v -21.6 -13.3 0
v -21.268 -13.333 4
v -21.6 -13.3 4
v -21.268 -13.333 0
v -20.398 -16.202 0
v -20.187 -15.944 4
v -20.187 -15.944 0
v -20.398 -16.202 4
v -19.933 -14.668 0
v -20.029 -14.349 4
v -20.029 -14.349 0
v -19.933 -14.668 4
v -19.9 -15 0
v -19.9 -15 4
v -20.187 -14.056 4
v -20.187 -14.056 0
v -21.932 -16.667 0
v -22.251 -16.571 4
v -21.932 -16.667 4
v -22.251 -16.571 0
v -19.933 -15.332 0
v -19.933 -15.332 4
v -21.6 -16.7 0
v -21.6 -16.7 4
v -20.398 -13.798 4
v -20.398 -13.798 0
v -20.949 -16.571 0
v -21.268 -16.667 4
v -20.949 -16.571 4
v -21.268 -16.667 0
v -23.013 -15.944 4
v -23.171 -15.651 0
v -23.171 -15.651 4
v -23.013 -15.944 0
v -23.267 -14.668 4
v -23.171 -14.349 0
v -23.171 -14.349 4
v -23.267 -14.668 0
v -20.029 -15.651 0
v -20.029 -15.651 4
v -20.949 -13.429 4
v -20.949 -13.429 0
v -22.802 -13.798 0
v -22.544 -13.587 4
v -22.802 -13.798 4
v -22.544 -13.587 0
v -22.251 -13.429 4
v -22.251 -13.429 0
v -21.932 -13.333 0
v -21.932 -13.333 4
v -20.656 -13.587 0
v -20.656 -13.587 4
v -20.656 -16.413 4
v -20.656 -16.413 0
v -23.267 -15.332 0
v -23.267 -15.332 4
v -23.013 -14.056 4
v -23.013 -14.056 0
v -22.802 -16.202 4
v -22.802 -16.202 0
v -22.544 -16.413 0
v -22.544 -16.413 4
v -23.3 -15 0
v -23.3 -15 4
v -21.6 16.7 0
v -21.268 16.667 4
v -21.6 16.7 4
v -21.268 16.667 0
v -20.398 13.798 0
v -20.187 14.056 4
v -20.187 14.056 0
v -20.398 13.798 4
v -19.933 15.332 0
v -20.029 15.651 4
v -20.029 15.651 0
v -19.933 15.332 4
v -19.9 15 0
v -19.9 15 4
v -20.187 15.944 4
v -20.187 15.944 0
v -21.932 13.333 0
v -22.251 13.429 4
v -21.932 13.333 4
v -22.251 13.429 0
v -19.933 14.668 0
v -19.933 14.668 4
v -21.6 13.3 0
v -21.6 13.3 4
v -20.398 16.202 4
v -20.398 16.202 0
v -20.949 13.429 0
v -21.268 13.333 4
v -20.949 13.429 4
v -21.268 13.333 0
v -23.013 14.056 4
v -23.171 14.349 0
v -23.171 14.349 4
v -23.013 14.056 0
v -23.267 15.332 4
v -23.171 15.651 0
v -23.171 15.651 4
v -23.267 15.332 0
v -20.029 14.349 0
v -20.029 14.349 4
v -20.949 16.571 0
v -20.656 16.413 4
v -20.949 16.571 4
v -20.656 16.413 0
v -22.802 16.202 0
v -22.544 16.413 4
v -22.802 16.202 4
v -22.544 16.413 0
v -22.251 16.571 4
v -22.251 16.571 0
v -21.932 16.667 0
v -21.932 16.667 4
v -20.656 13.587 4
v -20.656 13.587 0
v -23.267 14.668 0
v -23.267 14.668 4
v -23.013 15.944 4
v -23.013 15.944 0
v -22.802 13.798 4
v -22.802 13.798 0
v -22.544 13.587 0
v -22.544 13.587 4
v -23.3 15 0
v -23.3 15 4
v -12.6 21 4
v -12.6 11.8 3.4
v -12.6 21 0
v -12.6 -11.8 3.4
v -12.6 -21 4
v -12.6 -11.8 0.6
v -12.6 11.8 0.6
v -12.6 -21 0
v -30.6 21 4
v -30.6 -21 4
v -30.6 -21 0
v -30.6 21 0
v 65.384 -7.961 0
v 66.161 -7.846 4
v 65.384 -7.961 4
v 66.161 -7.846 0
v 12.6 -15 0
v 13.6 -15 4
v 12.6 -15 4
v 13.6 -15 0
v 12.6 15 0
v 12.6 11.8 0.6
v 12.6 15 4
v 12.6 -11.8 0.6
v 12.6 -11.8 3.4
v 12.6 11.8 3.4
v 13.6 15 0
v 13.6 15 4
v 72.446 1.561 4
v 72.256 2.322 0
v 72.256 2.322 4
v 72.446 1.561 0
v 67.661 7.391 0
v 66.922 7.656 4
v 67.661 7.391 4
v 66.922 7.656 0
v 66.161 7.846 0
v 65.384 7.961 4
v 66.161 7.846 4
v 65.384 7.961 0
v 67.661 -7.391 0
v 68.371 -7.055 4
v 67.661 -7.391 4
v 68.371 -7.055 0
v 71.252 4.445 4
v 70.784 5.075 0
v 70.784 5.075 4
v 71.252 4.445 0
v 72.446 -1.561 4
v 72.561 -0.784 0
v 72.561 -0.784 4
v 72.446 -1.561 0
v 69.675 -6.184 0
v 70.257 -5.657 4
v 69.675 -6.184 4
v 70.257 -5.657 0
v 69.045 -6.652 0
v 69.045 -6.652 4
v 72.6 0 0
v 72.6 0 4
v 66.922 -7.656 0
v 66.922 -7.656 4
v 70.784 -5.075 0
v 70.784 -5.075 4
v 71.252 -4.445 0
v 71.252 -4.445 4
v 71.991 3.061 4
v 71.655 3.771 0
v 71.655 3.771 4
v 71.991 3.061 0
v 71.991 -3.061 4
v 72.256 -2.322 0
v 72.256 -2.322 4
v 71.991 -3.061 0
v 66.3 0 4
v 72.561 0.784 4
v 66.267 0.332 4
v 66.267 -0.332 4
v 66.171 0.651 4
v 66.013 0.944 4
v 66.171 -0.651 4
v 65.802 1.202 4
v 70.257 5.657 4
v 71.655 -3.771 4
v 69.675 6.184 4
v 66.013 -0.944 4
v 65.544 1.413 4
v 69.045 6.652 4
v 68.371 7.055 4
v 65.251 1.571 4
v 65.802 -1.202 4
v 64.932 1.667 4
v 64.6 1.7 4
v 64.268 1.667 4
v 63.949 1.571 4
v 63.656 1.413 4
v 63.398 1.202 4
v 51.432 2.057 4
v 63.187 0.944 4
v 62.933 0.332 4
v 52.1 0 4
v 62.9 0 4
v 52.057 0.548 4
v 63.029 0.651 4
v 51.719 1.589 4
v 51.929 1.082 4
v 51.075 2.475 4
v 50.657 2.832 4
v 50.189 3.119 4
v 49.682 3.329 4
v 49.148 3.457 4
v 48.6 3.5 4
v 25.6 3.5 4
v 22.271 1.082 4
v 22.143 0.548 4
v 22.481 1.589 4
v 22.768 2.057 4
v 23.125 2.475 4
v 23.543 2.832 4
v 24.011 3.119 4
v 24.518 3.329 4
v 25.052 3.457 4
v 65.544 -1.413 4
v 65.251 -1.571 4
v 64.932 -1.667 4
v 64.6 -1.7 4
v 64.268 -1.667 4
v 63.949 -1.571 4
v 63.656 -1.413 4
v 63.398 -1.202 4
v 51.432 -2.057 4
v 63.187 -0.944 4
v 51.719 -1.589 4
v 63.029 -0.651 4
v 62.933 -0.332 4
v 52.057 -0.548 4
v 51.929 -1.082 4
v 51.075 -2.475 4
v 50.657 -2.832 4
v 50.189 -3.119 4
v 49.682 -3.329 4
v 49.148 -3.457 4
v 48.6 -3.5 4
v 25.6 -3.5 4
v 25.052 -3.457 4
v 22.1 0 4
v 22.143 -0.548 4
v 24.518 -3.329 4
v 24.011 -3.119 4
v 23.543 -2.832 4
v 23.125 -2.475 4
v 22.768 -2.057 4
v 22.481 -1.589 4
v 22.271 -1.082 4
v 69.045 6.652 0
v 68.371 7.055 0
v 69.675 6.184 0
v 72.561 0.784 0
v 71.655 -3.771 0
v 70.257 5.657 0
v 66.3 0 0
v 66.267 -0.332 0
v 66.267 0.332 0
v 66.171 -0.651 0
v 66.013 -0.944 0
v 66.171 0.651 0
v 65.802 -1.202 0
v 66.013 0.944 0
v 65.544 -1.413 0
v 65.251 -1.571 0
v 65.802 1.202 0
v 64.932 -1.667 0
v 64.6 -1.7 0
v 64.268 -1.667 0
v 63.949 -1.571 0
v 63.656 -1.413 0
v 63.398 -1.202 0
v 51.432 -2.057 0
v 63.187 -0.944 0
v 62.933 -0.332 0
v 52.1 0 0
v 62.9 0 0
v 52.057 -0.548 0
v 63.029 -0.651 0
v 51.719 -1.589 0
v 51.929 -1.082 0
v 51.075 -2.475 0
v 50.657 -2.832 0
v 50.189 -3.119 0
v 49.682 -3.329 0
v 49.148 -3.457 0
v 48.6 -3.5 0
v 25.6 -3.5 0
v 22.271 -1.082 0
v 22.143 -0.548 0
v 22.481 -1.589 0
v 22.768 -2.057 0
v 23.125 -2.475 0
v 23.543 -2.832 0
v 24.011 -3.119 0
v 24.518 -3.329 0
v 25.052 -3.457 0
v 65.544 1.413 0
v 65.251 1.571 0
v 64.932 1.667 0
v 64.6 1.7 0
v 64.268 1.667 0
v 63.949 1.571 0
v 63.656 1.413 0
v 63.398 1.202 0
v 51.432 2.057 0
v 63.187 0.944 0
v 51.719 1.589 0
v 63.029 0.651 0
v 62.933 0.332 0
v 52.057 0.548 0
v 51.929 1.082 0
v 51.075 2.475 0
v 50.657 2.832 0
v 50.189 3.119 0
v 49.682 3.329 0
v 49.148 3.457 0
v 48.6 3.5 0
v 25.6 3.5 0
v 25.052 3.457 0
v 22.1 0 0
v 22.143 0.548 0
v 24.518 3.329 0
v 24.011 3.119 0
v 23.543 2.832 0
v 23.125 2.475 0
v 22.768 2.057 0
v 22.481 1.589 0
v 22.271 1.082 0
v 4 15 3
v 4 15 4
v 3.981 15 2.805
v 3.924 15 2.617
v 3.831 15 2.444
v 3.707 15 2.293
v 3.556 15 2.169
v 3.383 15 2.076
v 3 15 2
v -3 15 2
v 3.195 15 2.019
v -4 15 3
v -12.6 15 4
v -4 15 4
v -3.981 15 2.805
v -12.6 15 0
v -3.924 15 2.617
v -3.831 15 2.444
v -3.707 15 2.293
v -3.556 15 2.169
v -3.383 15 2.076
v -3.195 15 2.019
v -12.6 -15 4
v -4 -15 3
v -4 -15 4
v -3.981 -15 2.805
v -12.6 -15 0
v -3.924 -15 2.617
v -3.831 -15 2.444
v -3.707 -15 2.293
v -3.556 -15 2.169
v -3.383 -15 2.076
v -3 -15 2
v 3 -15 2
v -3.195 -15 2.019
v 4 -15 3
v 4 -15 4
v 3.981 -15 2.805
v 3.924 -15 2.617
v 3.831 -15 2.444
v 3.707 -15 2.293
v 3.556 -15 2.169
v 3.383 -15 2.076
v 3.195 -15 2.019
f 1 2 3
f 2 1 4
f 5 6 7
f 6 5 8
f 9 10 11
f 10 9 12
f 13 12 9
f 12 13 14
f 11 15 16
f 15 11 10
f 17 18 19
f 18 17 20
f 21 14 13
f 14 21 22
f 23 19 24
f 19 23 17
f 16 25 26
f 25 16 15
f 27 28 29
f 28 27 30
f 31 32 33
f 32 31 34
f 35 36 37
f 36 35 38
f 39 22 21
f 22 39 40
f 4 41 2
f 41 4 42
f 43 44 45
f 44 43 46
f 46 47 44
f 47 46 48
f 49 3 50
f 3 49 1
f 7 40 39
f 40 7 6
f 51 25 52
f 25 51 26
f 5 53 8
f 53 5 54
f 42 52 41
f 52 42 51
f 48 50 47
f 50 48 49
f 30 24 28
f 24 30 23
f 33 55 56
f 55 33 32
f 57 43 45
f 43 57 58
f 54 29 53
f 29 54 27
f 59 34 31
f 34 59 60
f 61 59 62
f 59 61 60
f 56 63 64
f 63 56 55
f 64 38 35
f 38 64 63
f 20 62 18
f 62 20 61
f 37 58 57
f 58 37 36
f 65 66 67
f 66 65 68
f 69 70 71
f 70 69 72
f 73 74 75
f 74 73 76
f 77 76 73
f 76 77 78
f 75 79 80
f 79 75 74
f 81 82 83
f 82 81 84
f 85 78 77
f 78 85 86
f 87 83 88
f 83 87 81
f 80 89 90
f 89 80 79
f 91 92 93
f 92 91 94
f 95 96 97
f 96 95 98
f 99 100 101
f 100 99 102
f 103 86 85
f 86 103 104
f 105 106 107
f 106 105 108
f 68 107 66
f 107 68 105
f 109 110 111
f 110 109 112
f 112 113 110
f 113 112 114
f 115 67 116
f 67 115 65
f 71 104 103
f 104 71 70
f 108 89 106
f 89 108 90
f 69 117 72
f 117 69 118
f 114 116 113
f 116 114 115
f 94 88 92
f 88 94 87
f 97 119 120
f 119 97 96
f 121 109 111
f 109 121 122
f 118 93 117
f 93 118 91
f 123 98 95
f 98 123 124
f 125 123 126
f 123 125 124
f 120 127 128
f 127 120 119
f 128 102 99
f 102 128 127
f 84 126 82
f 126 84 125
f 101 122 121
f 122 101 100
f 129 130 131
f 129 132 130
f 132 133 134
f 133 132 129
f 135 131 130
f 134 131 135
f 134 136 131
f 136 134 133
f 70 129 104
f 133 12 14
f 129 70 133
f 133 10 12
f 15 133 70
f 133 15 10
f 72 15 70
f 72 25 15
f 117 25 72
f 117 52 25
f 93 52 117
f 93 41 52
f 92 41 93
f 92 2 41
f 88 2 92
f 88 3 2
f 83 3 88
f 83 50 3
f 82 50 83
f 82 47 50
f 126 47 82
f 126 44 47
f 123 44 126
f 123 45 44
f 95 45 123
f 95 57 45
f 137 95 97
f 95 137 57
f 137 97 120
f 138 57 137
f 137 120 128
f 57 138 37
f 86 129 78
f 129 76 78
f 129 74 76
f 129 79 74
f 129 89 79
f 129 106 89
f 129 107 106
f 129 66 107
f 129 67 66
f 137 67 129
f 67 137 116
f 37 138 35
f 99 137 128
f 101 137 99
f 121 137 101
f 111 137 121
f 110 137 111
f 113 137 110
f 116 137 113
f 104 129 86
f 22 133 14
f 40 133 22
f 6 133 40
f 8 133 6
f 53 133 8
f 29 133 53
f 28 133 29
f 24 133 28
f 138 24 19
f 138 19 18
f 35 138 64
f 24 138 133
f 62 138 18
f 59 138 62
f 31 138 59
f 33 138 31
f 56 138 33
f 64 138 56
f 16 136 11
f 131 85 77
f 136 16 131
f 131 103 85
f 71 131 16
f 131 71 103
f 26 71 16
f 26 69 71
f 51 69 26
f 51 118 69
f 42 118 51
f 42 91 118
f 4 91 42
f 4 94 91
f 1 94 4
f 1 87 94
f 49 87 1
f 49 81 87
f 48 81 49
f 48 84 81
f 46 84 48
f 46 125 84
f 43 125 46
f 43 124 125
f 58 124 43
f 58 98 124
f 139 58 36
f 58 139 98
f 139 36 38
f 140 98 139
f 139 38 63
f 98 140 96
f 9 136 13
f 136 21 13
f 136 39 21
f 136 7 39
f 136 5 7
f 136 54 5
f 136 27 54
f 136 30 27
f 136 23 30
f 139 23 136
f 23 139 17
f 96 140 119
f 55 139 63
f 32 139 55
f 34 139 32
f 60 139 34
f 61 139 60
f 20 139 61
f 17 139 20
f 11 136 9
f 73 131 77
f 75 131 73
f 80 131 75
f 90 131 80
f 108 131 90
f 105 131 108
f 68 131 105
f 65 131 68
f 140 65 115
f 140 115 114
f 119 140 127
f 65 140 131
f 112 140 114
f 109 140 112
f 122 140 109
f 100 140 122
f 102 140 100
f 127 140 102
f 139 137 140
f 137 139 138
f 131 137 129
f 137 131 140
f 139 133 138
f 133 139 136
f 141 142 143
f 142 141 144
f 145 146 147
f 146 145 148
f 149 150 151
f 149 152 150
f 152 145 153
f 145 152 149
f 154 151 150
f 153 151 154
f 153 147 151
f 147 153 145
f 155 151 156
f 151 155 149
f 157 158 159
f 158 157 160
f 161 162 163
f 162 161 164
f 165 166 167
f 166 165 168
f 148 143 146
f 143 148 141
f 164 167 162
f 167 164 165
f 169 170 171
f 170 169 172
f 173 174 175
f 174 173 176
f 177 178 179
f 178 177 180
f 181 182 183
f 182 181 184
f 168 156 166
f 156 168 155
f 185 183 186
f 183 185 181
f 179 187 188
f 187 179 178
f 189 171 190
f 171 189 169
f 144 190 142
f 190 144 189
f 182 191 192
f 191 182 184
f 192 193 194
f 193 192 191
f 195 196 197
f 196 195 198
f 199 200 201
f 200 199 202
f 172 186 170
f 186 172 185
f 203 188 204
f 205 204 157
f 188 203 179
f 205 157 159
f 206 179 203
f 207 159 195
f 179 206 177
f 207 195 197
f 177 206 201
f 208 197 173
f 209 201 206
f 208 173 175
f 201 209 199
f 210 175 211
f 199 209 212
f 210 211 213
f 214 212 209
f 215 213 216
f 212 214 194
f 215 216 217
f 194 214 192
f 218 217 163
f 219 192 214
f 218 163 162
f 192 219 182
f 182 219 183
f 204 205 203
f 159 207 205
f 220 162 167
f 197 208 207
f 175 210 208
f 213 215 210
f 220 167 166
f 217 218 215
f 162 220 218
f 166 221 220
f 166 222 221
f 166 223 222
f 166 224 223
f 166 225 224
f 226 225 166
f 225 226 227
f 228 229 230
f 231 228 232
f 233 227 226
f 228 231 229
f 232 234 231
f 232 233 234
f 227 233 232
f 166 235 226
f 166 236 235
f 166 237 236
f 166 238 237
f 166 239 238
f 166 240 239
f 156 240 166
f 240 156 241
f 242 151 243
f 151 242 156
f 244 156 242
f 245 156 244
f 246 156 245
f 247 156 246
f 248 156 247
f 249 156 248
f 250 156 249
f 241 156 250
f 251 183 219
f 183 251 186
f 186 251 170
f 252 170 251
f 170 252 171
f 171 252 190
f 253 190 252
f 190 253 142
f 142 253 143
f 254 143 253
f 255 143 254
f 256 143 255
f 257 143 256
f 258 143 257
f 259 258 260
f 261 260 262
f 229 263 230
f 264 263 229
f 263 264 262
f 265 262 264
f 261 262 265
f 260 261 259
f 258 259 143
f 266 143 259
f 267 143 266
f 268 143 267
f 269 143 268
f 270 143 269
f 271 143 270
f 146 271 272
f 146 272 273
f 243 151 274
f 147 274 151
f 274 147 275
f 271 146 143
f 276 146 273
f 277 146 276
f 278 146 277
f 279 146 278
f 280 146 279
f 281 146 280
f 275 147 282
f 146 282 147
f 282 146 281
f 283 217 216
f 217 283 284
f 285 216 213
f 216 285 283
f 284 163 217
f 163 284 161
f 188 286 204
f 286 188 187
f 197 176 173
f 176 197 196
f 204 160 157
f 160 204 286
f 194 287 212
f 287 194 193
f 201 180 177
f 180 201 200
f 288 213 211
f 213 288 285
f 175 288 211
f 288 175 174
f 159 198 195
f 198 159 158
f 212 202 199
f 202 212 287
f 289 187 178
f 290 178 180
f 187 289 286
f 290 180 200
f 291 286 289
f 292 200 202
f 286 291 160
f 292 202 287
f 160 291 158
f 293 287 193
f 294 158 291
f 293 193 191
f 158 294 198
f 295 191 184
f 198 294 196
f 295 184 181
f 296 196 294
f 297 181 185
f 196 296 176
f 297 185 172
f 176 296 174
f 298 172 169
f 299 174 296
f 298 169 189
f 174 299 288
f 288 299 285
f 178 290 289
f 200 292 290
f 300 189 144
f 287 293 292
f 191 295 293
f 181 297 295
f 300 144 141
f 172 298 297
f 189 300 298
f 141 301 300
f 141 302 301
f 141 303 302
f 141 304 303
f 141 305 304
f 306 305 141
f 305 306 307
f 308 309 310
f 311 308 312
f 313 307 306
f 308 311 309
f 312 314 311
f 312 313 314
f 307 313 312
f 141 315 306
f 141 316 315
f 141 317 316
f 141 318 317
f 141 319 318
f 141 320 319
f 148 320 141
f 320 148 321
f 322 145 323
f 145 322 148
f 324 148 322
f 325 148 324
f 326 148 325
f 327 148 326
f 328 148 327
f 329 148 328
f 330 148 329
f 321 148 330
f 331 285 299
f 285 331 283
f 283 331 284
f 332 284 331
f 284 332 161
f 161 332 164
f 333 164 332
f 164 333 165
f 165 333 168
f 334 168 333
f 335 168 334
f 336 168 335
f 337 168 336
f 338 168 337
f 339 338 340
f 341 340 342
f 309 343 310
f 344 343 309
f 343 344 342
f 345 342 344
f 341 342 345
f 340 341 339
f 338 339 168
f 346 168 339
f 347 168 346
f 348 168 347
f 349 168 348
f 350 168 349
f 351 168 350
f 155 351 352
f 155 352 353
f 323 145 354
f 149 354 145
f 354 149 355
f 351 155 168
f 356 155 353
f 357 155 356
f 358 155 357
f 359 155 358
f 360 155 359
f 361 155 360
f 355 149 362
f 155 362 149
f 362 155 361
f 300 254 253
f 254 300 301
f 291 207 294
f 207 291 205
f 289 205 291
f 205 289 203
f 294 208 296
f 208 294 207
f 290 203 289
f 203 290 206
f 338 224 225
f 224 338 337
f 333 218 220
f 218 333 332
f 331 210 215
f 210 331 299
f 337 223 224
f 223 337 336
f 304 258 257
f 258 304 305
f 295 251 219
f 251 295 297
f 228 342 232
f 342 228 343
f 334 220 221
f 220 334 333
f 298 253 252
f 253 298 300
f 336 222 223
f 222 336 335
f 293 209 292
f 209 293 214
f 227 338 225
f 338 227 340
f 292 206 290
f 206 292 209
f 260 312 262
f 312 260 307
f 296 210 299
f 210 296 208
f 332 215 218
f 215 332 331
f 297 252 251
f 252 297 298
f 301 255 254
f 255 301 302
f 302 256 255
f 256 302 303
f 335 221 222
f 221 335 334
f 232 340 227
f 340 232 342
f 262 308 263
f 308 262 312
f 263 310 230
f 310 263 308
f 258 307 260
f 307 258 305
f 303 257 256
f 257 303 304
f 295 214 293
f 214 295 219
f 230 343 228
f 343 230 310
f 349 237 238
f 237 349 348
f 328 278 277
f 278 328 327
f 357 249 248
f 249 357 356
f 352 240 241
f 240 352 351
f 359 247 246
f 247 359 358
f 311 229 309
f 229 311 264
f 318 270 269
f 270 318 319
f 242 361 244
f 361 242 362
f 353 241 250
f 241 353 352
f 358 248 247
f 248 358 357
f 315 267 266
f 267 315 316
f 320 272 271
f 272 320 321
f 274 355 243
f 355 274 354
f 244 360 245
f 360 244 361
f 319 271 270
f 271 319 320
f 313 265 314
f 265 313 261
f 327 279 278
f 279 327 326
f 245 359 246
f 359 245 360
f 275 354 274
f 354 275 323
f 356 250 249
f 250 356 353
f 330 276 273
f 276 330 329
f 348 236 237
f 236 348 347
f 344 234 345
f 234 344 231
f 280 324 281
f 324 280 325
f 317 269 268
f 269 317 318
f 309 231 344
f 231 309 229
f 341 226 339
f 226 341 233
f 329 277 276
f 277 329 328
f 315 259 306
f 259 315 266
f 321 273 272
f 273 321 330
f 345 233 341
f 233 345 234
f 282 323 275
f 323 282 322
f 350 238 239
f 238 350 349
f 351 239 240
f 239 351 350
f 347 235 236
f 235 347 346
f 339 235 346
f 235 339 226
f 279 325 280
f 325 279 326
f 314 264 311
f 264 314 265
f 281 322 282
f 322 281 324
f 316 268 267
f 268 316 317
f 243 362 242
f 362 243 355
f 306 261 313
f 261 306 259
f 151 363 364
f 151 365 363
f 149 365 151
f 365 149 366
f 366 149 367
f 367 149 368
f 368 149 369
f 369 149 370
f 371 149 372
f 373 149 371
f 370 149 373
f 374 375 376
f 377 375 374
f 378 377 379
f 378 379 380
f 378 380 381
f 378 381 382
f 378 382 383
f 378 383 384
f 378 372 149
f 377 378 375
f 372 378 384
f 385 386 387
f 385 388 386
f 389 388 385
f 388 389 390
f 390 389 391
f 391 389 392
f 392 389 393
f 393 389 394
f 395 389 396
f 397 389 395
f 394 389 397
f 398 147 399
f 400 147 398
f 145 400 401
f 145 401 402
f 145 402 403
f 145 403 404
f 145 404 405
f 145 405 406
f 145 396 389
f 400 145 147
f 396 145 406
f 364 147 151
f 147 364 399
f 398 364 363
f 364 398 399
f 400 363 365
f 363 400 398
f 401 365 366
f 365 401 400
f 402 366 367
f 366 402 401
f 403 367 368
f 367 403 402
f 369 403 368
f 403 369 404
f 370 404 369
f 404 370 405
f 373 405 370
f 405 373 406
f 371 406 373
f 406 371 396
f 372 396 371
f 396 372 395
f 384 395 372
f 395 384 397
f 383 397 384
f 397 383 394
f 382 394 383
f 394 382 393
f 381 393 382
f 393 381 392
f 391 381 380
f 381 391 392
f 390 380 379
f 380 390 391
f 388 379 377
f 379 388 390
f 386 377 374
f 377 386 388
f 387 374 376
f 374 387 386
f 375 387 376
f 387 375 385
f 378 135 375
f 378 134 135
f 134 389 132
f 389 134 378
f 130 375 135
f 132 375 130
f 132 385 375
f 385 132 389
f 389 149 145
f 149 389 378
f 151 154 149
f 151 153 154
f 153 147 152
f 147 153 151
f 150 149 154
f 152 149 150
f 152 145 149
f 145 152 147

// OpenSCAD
// file: ../params.scad
// Shared settings for PETG + TPU hybrid parts (Bambu Lab H2D, 0.4 mm nozzles)
// -----------------------------------------------------------------------
// Conventions used by every block in blocks/:
//  - millimetres; Z is the print direction (the build plate is z = 0);
//  - every block is a module with a `part` argument:
//      "petg" -> the PETG body only, "tpu" -> the TPU body only,
//      "both" -> both, coloured, for previews;
//  - the TPU body is always (TPU region) minus (PETG body), so the two share
//    exact faces and never overlap;
//  - every PETG/TPU interface is held by shape, not by adhesion: the TPU
//    must not be able to slide out of the PETG in any direction
//    (tools/capture_check.py tests this).

layer_h = 0.2;
line_w = 0.42;            // extrusion width
min_tpu = 1.2;            // thinnest TPU wall: 3 lines
min_petg = 1.2;           // thinnest PETG wall: 3 lines
xy_clear = 0.4;           // side clearance between separate moving parts
z_clear = 0.6;            // empty layers between stacked moving parts (3 x 0.2)

// anchor features (PETG reaching into TPU)
anchor_neck = 1.3;        // dovetail neck at the PETG surface
anchor_head = 2.3;        // dovetail head inside the TPU
anchor_depth = 1.2;
anchor_gap_z = 1.2;       // TPU-filled breaks along a rib, so the TPU also wraps over it
rivet_d = 2.4;            // holes through PETG that TPU fills

petg_colour = "#3b6e9c";
tpu_colour = "#e2572b";
eps = 0.01;

// Show/return one material. Children: child(0) = PETG body, child(1) = TPU region.
module hybrid(part) {
    if (part == "petg") children(0);
    else if (part == "tpu") difference() { children(1); children(0); }
    else {
        color(petg_colour) children(0);
        color(tpu_colour) difference() { children(1); children(0); }
    }
}
// main file
include <../params.scad>
// =======================================================================
// flex_hinge: a TPU living hinge joining two PETG parts
// =======================================================================
// WHAT IT IS FOR
//   A fold line printed in place, in the same print as the rigid parts:
//   two PETG parts side by side, joined by a short flat TPU web that bends
//   about an axis parallel to their edges (the Y axis here). Nothing to
//   assemble, no pins, no wear, no backlash, and it springs back.
//   On rovers and drones: compliant legs and bumpers, folding arms, sensor
//   and camera flaps, battery and hatch doors, cable covers, gripper fingers.
//
// HOW IT WORKS (every PETG/TPU joint holds by shape, never by adhesion)
//
//   side view (cut along X):
//        plate A          TPU block        web        TPU block         plate B
//   +----------------+---------------+           +---------------+----------------+ z = t
//   |                /               |           |               \                |
//   |      PETG      ==== tongue ==T |           | T== tongue ====      PETG      |
//   |                \                \_________/                /                |
//   +----------------+-------------------------------------------+----------------+ z = 0
//                     <-- block_l --> r<- gap ->r <-- block_l -->   (web: web_t thick, on the bed)
//   plan of one tongue (inside its TPU block; P = TPU pockets the hooks bear on):
//                 |PPP+--+PPP+--+
//        plate    |===|  |===|  |      the neck carries the bending; the barb
//        edge     |===|  |===|  |      and the T-head stick out beside it
//                 |PPP+--+PPP+--+
//                     barb    head
//
//   - Each plate edge grows a thin PETG tongue at mid-thickness (like bond
//     coupon F): a neck ending in a wider T-head, with `barbs` extra pairs
//     of hooks along the neck (a "fir tree", like the staggered ribs of the
//     ratchet band). The tongue is wrapped on every side by a TPU block the
//     full thickness of the plate: skins >= 1.2 mm above and below, side
//     walls beside the hooks, a tip wall in front of the head, and TPU
//     pockets behind every hook.
//     Pulled away from the plate, the TPU bears on the backs of the hooks;
//     pushed, it bears on the plate edge and on the head front; up/down and
//     sideways it is boxed in by its own skins and walls.
//     tools/capture_check.py confirms the TPU cannot slide out in any of 26
//     directions.
//   - The hooks stick out BESIDE the neck, so they do not weaken it. That
//     matters: with no adhesion the PETG tongue carries ~85 % of the fold
//     moment (2D FE, see ESTIMATES), so the neck's net section is the most
//     loaded PETG in every fold cycle. Rivet holes through the neck (coupon G) are
//     therefore optional and off by default; a small 45 deg chamfer at the
//     tongue root takes the sharp corner out of the most stressed spot.
//   - Between the two blocks a thinner TPU web, lying on the bed, is the
//     bending zone. It is printed flat, so the bending strain runs along the
//     extrusion lines inside each layer, never across layer boundaries (no
//     layer peeling). Small fillets (root_r) round the corners where the web
//     meets the blocks, so the strain does not peak at a sharp notch.
//   - The blocks are 2x thicker than the web (8x stiffer in bending) and
//     carry a PETG tongue, so practically all bending happens in the web.
//
// PRINTING (Bambu Lab H2D, 0.4 mm nozzles, 0.2 mm layers, no supports)
//   PETG left nozzle, TPU 95A right nozzle. Lay it flat as modelled (the web
//   on the bed). The tongue's underside and its lower root chamfer (45 deg)
//   are printed on the TPU skin, and the TPU skin on top of the tongue is
//   printed on PETG; nothing else hangs.
//   Print the TPU solid (100 % infill, or >= 4 walls and >= 5 top/bottom
//   layers) so the web and the skins have no voids; if your slicer lets you,
//   run the TPU's solid lines across the fold axis (along X).
//
// PARAMETERS (mm, degrees). Defaults and the rule behind each:
//   width     = 20   hinge width along the fold axis (Y). Stiffness and
//                    strength scale linearly with it. >= 2 * side +
//                    2 * head_over + 3 * 1.2 = 10; width <= the plate width.
//   gap       = 6    free web length (X), flat part between the two root
//                    fillets. Rule: bending strain at fold angle theta (rad)
//                       eps = theta * web_t / (2 * gap)
//                    so for eps <= ~25 % at 90 deg:  gap >= 3 * web_t
//                    (gap = 3 * web_t gives pi/12 = 26 %). Asserted against
//                    `fold`: eps(fold) <= pi/12. The fillets and the blocks
//                    add bending length, so the formula is on the safe side
//                    (FE: 21 % at 90 deg for the defaults).
//   web_t     = 2.0  web thickness (Z, 10 layers). >= 1.2 (min_tpu). Fold
//                    stiffness grows with web_t^3, strength with web_t, and
//                    at the strain limit the fold moment grows with web_t^2,
//                    which loads the PETG tongue (see "Tongue" below).
//   plate     = [25, 20, 4]  plate A [length X, width Y, thickness Z];
//                    plate_b defaults to the same. Thickness t is also the
//                    TPU block height. Rule: t >= 2 * skin + 1.2 = 3.6
//                    (1.2 mm TPU skins over a >= 1.2 mm PETG tongue).
//   fold      = 90   design fold angle used for the strain and tongue checks.
//   root_r    = 1.0  fillet radius where the web meets each block (<= t - web_t).
//   skin      = 1.2  TPU above and below the tongue (min_tpu, 6 layers).
//                    The tongue is t - 2 * skin thick (1.6 at t = 4).
//   side      = 1.6  TPU wall beside the hooks (Y). >= min_tpu.
//   neck_l    = 5.0  tongue neck length from the plate edge (X). It holds
//                    2 * barbs + 1 equal segments (pocket, barb, pocket,
//                    ...), each >= 1.2: neck_l >= 1.2 * (2 * barbs + 1).
//   head_l    = 2.0  T-head length (X). >= min_petg.
//   head_over = 1.6  how far the head and barbs stick out past the neck on
//                    each side (Y): the hooks the TPU pockets bear on.
//                    >= min_tpu so the pockets are 3 lines wide.
//   barbs     = 1    extra hook pairs along the neck (0 = T-head only).
//                    Each pair adds as much pull-out bearing as the head.
//   tip       = 1.6  TPU wall in front of the head (X). >= min_tpu.
//   chamfer   = 0.6  45 deg chamfer at the tongue root, top and bottom
//                    (3 layers). Cuts the root-corner stress peak by ~16 %
//                    (FE). <= skin - 0.6, so >= 0.6 mm TPU stays at the face.
//   rivet_d   = 0    optional TPU-filled holes through the neck (coupon G);
//                    >= 1.6 when used (params rivet_d = 2.4). Off by default:
//                    each hole cuts the neck's bending section (3 x 2.4 mm
//                    holes would double the tongue stress, see ESTIMATES).
//                    Use them for links that see pull more than folding.
//   rivet_pitch = 4.0  hole spacing (Y) when rivet_d > 0; as many as fit
//                    with >= 1.2 mm PETG to the neck edges.
//   overlap   = 1.0  how far the anchor reaches back into your part, so the
//                    two fuse into one PETG body.
//   holes_a, holes_b = []  mounting holes in plate A / B as [distance from
//                    the hinge edge, y]; hole_d = 3.4 (M3 clearance).
//   label     = ""   text engraved 0.6 mm into the top of plate B.
//   Derived: block_l = neck_l + head_l + tip = 8.6 (each TPU block, X);
//   the plate edges sit at x = +-e, e = gap/2 + root_r + block_l = 12.6
//   (flex_hinge_edge_x()); neck width = width - 2 * side - 2 * head_over
//   = 13.6.
//
// ESTIMATES (defaults: width w = 20, web_t h = 2, gap L = 6, t = 4;
//            TPU 95A E ~ 26 MPa, G ~ 9 MPa; PETG E ~ 2000 MPa, ~45 MPa).
//   Hand formulas, cross-checked with a 2D plane-strain FE (CalculiX) of
//   the XZ section with no PETG/TPU adhesion on the faces that open.
//   Fold stiffness   k = E * w * h^3 / (12 * L) = 26 * 20 * 8 / 72
//                      = 58 N*mm/rad (~1.0 N*mm per degree)
//                      (flex_hinge_k()). FE: 47 N*mm/rad, the TPU blocks
//                      and fillets add some compliance. Expect 40-60.
//   Moment at 90 deg M = k * pi/2 = 91 N*mm (FE 74): ~3.6 N pushing 25 mm
//                      from the fold. Linear theory; TPU softens a little
//                      at 20 % strain, so the real value is a bit lower.
//   Strain at 90 deg eps = (pi/2) * h / (2 L) = 26 %; FE peak 21 %, at the
//                      toe of the root fillets.
//   Tongue (PETG)    the tongue carries a share s ~ 0.85 of the fold moment
//                      (FE: 0.74 bonded .. 0.86 unbonded), as plate bending
//                      through its net neck section b x tongue:
//                      sigma = 6 * s * M / (b * tongue^2)
//                            = 6 * 0.85 * 91 / (13.6 * 1.6^2) = 13 MPa
//                      (flex_hinge_tongue_stress(); FE: 11 MPa nominal,
//                      17 MPa peak at the chamfer toe, 21 without the
//                      chamfer). About 1/3 of PETG strength, the fatigue
//                      budget: the module echoes a warning above 15 MPa
//                      and refuses above 22.5 MPa (1/2 strength). Three
//                      2.4 mm rivet holes (b = 6.4) would give 28 MPa plus
//                      the holes' own stress peak: a fatigue crack across
//                      the rivet row before the web wears out.
//                      At the strain limit M = E w h^2 eps / 6, so sigma ~
//                      (web_t / tongue)^2: a thicker web needs a thicker
//                      plate (or a smaller fold angle).
//   Fold-up limit    folding so the top faces close, the blocks touch at
//                      theta ~ (gap + 2 root_r) / (t - web_t/2) = 2.7 rad
//                      (~150 deg); folding the other way is limited only by
//                      the strain.
//   Axial (pull)     k_x = E * w * h / L = 26 * 40 / 6 = 170 N/mm (web only).
//   Sideways shear   k_y = G * w * h / L = 9 * 40 / 6 = 60 N/mm.
//   Yaw (in-plane)   E * (h * w^3 / 12) / L = 5800 N*mm/rad: 100x the fold
//                      stiffness ((w/h)^2), so it folds, it does not skew.
//   Twist (about X)  G * (w * h^3 / 3) / L = 9 * 53 / 6 = 80 N*mm/rad: as
//                      soft as the fold. Use two hinges spaced apart (or one
//                      wide one) where twist matters.
//   Web in tension   section w * h = 40 mm^2; at a working stress of 2.5 MPa
//                      (~10 % strain) 100 N; TPU breaks at ~25-35 MPa
//                      (1000+ N) after stretching several times its length.
//   Anchor pull-out  (no adhesion) bearing on the backs of the hooks:
//                      (1 + barbs) * 2 * head_over * tongue = 2 * 2 * 1.6 *
//                      1.6 = 10 mm^2; if the TPU around the hooks squeezes
//                      past them at ~8-12 MPa mean bearing, roughly
//                      80-120 N per anchor (each optional rivet adds
//                      rivet_d * tongue = 3.8 mm^2, ~40 N). A PETG barb (a
//                      1.6 mm cantilever, 1.67 x 1.6 root) breaks at ~40 N,
//                      more than its ~25 N share at that load. Measure your
//                      own with the bond-test pull coupons or this coupon.
//   Weakest link:  in FOLDING (the hinge's job) the TPU web works at its
//   ~25 % strain design limit and the PETG tongue at ~1/3 of its strength
//   every cycle; the coupon's fatigue test tells which goes first on your
//   printer (a whitened web, or a click and a sudden loss of stiffness from
//   a cracked tongue). In a straight PULL
//   the anchors let go (~100 N) long before the web breaks, so do not use
//   the hinge as a tension link above ~30-50 N working load; add a tether.
//
// TEST PIECE (show = "test"): flex_hinge_coupon(), a 90 deg flex-fatigue
//   coupon. Plate A (24 mm, two M3 holes) bolts or clamps flat with its
//   edge flush with the bench edge; plate B is a 40 mm lever with an M3
//   hole near its end for a servo horn link or a string. Fold B up to 90 deg
//   and back (by hand, or a servo at ~1 Hz) and count cycles. Every 1000
//   cycles look for: whitening or a crack across the web (record the
//   count), a gap opening between a TPU block and its plate, a click or
//   a sudden drop in stiffness (a cracked tongue), the head showing
//   through the skin. Then pull it apart with a luggage scale.
//   The web size is engraved on plate B ("T<web_t> L<gap>").
//
// MODULES (all take `part` = "petg" | "tpu" | "both" first)
//   flex_hinge(part, width, gap, web_t, plate, ...)   two plates + hinge
//   flex_hinge_joint(part, width, gap, web_t, t, ...) { your PETG parts }
//       the hinge alone (both anchors + TPU) between plate edges at
//       x = +-flex_hinge_edge_x(). Pass your own PETG parts (at |x| >= e)
//       as children: they are fused with the anchors and subtracted from
//       the TPU, so the two materials never overlap.
//   flex_hinge_anchor(part, width, t, ...)  one PETG anchor; edge frame:
//       the edge face on x = 0, your part on x < 0, the anchor points +x.
//       Union it with your PETG body.  ("tpu" draws nothing.)
//   flex_hinge_tpu_region(part, width, gap, web_t, t, ...)  the TPU REGION
//       (blocks + web, anchors NOT removed) for child(1) of hybrid().
//       ("petg" draws nothing.)
//   flex_hinge_coupon(part, ...)  the fatigue test coupon.
//   Functions: flex_hinge_edge_x(), flex_hinge_strain(), flex_hinge_min_gap(),
//       flex_hinge_k(), flex_hinge_tongue_stress().
//
// RULES FOR YOUR OWN PARTS
//   - Keep your PETG out of the hinge zone |x| < e, and give each part a
//     solid edge face at x = -e / +e at least `width` wide that covers
//     z = 0..t: the anchor root reaches `overlap` (1 mm) back into it.
//   - Parts may be thicker than t (the hinge sits at the bottom) but not
//     thinner.
//   - The two parts must not touch anywhere else, or they stop being two
//     bodies; give them xy_clear (0.4 mm) where they come close.
//   - Pass the same anchor parameters to flex_hinge_anchor() and
//     flex_hinge_tpu_region() if you use them separately.
//
// LIMITATIONS
//   - Not a precision pivot: the fold axis moves with the bending and the
//     hinge gives a little in tension and twist. Use a pin hinge to locate.
//   - TPU creeps: a hinge held folded for weeks takes a set; one that
//     carries a constant load (e.g. a leg spring under the robot's weight)
//     will sag over time.
//   - Fatigue life of printed TPU and of the thin PETG tongue is not known
//     in advance; run the coupon. The estimates above come from hand
//     formulas and a linear 2D FE (one XZ section, no plan-view effects
//     such as the stress raisers at the hook shoulders), not from tests.
//   - At 0.2 mm layers the 0.6 mm root chamfer prints as 2-3 small steps.
//   - Engraved labels leave small PETG islands inside letters such as 0,
//     6 or 8 (< 1.2 mm wide, resting on the plate): cosmetic only.
//   - The capture check treats the TPU as rigid. A large enough pull can
//     still squeeze the TPU past the hooks (see "Anchor pull-out").
//   - The web lies on the bed, so the hinge is not symmetric: folding so the
//     plate tops close is limited to ~150 deg by the blocks touching.
//     (A mid-thickness web would need a > 5 mm TPU bridge.)
//   - Twist stiffness is low (see above).
// =======================================================================

part = "both";   // [petg, tpu, both]
show = "demo";   // [demo, test, section]

// ---------------------------------------------------------------------
// Defaults shared by all modules (so anchors and TPU always agree)
// ---------------------------------------------------------------------
fh_width = 20;
fh_gap = 6;
fh_web_t = 2.0;
fh_t = 4;
fh_fold = 90;
fh_root_r = 1.0;
fh_skin = min_tpu;          // 1.2
fh_side = 1.6;
fh_neck_l = 5.0;
fh_head_l = 2.0;
fh_head_over = 1.6;
fh_barbs = 1;
fh_tip = 1.6;
fh_chamfer = 0.6;
fh_rivet_d = 0;             // off; params rivet_d (2.4) when wanted
fh_rivet_pitch = 4.0;
fh_overlap = 1.0;

// design limits
fh_strain_max = PI / 12;    // web strain: gap = 3 * web_t at 90 deg (26 %)
fh_share = 0.85;            // share of the fold moment the PETG tongue carries (FE)
fh_petg_strength = 45;      // MPa
fh_sigma_warn = fh_petg_strength / 3;   // 15 MPa: fatigue budget
fh_sigma_max = fh_petg_strength / 2;    // 22.5 MPa: refused above this

// ---------------------------------------------------------------------
// Functions
// ---------------------------------------------------------------------
// distance from the hinge centre to each plate edge
function flex_hinge_edge_x(gap = fh_gap, root_r = fh_root_r, neck_l = fh_neck_l, head_l = fh_head_l, tip = fh_tip) =
    gap / 2 + root_r + neck_l + head_l + tip;
// peak bending strain (fraction) in the web folded to `angle` degrees
function flex_hinge_strain(gap = fh_gap, web_t = fh_web_t, angle = fh_fold) = angle * PI / 180 * web_t / (2 * gap);
// shortest free web length for a strain limit at a fold angle
function flex_hinge_min_gap(web_t = fh_web_t, angle = fh_fold, strain = fh_strain_max) =
    angle * PI / 180 * web_t / (2 * strain);
// fold stiffness, N*mm per radian (E in MPa)
function flex_hinge_k(width = fh_width, gap = fh_gap, web_t = fh_web_t, E = 26) = E * width * pow(web_t, 3) / (12 * gap);
// rivet hole positions across the neck: as many as fit with min_petg walls
function fh_rivet_ys(neck_w, d, pitch) =
    let(n = d > 0 ? max(0, floor((neck_w - 2 * min_petg - d) / pitch) + 1) : 0)
    n > 0 ? [for (i = [0 : n - 1]) (i - (n - 1) / 2) * pitch] : [];
// nominal bending stress (MPa) in the PETG tongue's net neck section with the
// hinge folded to `fold` degrees: 6 * s * k * theta / (b_net * tongue^2)
function flex_hinge_tongue_stress(width = fh_width, gap = fh_gap, web_t = fh_web_t, t = fh_t, fold = fh_fold,
                                  skin = fh_skin, side = fh_side, head_over = fh_head_over,
                                  rivet_d = fh_rivet_d, rivet_pitch = fh_rivet_pitch) =
    let(neck_w = width - 2 * side - 2 * head_over,
        b = neck_w - len(fh_rivet_ys(neck_w, rivet_d, rivet_pitch)) * rivet_d,
        tongue = t - 2 * skin)
    6 * fh_share * flex_hinge_k(width, gap, web_t) * fold * PI / 180 / (b * tongue * tongue);

// the design rule: web strain at the design fold angle <= pi/12 (gap >= 3 * web_t at 90 deg)
module fh_check_strain(gap, web_t, fold)
    assert(flex_hinge_strain(gap, web_t, fold) <= fh_strain_max + 1e-9,
           str("flex_hinge: gap too short: strain at ", fold, " deg would be ",
               round(100 * flex_hinge_strain(gap, web_t, fold)), " % (limit 26 %); use gap >= ",
               ceil(10 * flex_hinge_min_gap(web_t, fold) - 1e-6) / 10, " (or set fold to a smaller angle)"));

// the PETG tongue must not be the part that fails when the hinge folds
module fh_check_tongue(width, gap, web_t, t, fold, skin, side, head_over, rivet_d, rivet_pitch) {
    s = flex_hinge_tongue_stress(width, gap, web_t, t, fold, skin, side, head_over, rivet_d, rivet_pitch);
    hint = " MPa; use a thinner web, a thicker plate (t), fewer or no rivet holes, or a smaller fold";
    assert(s <= fh_sigma_max, str("flex_hinge: PETG tongue overloaded: ~", round(s), " MPa at ", fold,
                                  " deg (limit ", fh_sigma_max, hint));
    if (s > fh_sigma_warn)
        echo(str("WARNING: flex_hinge: PETG tongue at ~", round(s), " MPa at ", fold,
                 " deg, above the fatigue budget of ", fh_sigma_warn, hint));
}

// ---------------------------------------------------------------------
// PETG anchor (edge frame: edge face on x = 0, part at x < 0, anchor +x)
// ---------------------------------------------------------------------
module flex_hinge_anchor(part = "petg", width = fh_width, t = fh_t, skin = fh_skin, side = fh_side,
                         neck_l = fh_neck_l, head_l = fh_head_l, head_over = fh_head_over, barbs = fh_barbs,
                         chamfer = fh_chamfer, rivet_d = fh_rivet_d, rivet_pitch = fh_rivet_pitch,
                         overlap = fh_overlap) {
    head_w = width - 2 * side;
    neck_w = head_w - 2 * head_over;
    tongue = t - 2 * skin;
    seg = neck_l / (2 * barbs + 1);          // pocket, barb, pocket, ... along the neck
    assert(skin >= min_tpu, "flex_hinge: skin must be >= min_tpu");
    assert(side >= min_tpu, "flex_hinge: side must be >= min_tpu");
    assert(head_over >= min_tpu, "flex_hinge: head_over must be >= min_tpu");
    assert(tongue >= min_petg, str("flex_hinge: t must be >= ", 2 * skin + min_petg, " (two TPU skins + a PETG tongue)"));
    assert(head_l >= min_petg, "flex_hinge: head_l must be >= min_petg");
    assert(neck_w >= 3 * min_petg, str("flex_hinge: width too small, needs >= ", 2 * side + 2 * head_over + 3 * min_petg));
    assert(barbs >= 0 && barbs == floor(barbs), "flex_hinge: barbs must be 0, 1, 2, ...");
    assert(seg >= max(min_tpu, min_petg) - 1e-9,
           str("flex_hinge: neck_l too short for ", barbs, " barbs, needs >= ", 1.2 * (2 * barbs + 1)));
    assert(chamfer >= 0 && chamfer <= skin - 3 * layer_h + 1e-9, "flex_hinge: chamfer must be 0 .. skin - 0.6");
    assert(rivet_d == 0 || rivet_d >= 1.6, "flex_hinge: rivet holes must be >= 1.6 mm");
    assert(rivet_d == 0 || neck_l >= rivet_d + 2 * min_petg, "flex_hinge: neck_l too short for the rivet holes");
    if (part == "petg") fh_anchor_3d();
    else if (part == "both") color(petg_colour) fh_anchor_3d();

    module fh_anchor_3d() {
        translate([0, 0, skin]) linear_extrude(tongue) difference() {
            union() {
                translate([-overlap, -neck_w / 2]) square([overlap + neck_l + eps, neck_w]);
                translate([neck_l, -head_w / 2]) square([head_l, head_w]);
                if (barbs > 0) for (i = [1 : barbs])
                    translate([(2 * i - 1) * seg, -head_w / 2]) square([seg, head_w]);
            }
            for (y = fh_rivet_ys(neck_w, rivet_d, rivet_pitch))
                translate([neck_l / 2, y]) circle(d = rivet_d, $fn = 24);
        }
        // 45 deg root chamfers above and below the tongue, across the neck
        if (chamfer > 0)
            rotate([90, 0, 0]) linear_extrude(neck_w, center = true)
                polygon([[-overlap, skin - chamfer], [0, skin - chamfer], [chamfer, skin], [chamfer, t - skin],
                         [0, t - skin + chamfer], [-overlap, t - skin + chamfer]]);
    }
}

// ---------------------------------------------------------------------
// TPU region: two blocks + the web with root fillets (hinge frame:
// centred on x = 0, edges at x = +-e, y centred, sits on z = 0).
// This is the REGION: hybrid() subtracts the PETG anchors from it.
// ---------------------------------------------------------------------
module flex_hinge_tpu_region(part = "tpu", width = fh_width, gap = fh_gap, web_t = fh_web_t, t = fh_t,
                             fold = fh_fold, root_r = fh_root_r, neck_l = fh_neck_l, head_l = fh_head_l,
                             tip = fh_tip) {
    e = flex_hinge_edge_x(gap, root_r, neck_l, head_l, tip);
    g2 = gap / 2;
    r = root_r;
    nf = 8;
    assert(web_t >= min_tpu, "flex_hinge: web_t must be >= min_tpu (1.2)");
    assert(tip >= min_tpu, "flex_hinge: tip must be >= min_tpu");
    assert(r >= 0 && web_t + r <= t, "flex_hinge: root_r must be 0 .. t - web_t");
    fh_check_strain(gap, web_t, fold);
    face = web_t + r < t - eps;     // a vertical block face above the fillet?
    profile = concat(
        [[-e, 0], [e, 0], [e, t]],
        face ? [[g2 + r, t]] : [],
        r > 0 ? [for (i = [0 : nf]) let(a = -90 * i / nf) [g2 + r * cos(a), web_t + r + r * sin(a)]]
              : [[g2, web_t]],
        r > 0 ? [for (i = [0 : nf]) let(a = -90 - 90 * i / nf) [-g2 + r * cos(a), web_t + r + r * sin(a)]]
              : [[-g2, web_t]],
        face ? [[-g2 - r, t]] : [],
        [[-e, t]]);
    if (part != "petg")
        rotate([90, 0, 0]) linear_extrude(width, center = true) polygon(profile);
}

// ---------------------------------------------------------------------
// The hinge alone: both anchors + TPU, plate edges at x = +-e.
// Children (optional) = your PETG parts: fused with the anchors and
// subtracted from the TPU.
// ---------------------------------------------------------------------
module flex_hinge_joint(part = "both", width = fh_width, gap = fh_gap, web_t = fh_web_t, t = fh_t,
                        fold = fh_fold, root_r = fh_root_r, skin = fh_skin, side = fh_side,
                        neck_l = fh_neck_l, head_l = fh_head_l, head_over = fh_head_over, barbs = fh_barbs,
                        tip = fh_tip, chamfer = fh_chamfer, rivet_d = fh_rivet_d, rivet_pitch = fh_rivet_pitch,
                        overlap = fh_overlap) {
    e = flex_hinge_edge_x(gap, root_r, neck_l, head_l, tip);
    fh_check_strain(gap, web_t, fold);
    fh_check_tongue(width, gap, web_t, t, fold, skin, side, head_over, rivet_d, rivet_pitch);
    if (part == "both") {
        // each material rendered on its own: the F5 preview of the nested
        // difference inside hybrid() otherwise shows z-fighting artifacts
        color(petg_colour) render() fh_hybrid("petg") children();
        color(tpu_colour) render() fh_hybrid("tpu") children();
    } else fh_hybrid(part) children();

    module fh_hybrid(p) hybrid(p) {
        union() {
            fh_anchors();
            children();
        }
        flex_hinge_tpu_region("tpu", width = width, gap = gap, web_t = web_t, t = t, fold = fold,
                              root_r = root_r, neck_l = neck_l, head_l = head_l, tip = tip);
    }
    module fh_anchors() for (s = [-1, 1])
        translate([s * e, 0, 0]) mirror([s > 0 ? 1 : 0, 0, 0])
            flex_hinge_anchor("petg", width = width, t = t, skin = skin, side = side, neck_l = neck_l,
                              head_l = head_l, head_over = head_over, barbs = barbs, chamfer = chamfer,
                              rivet_d = rivet_d, rivet_pitch = rivet_pitch, overlap = overlap);
}

// ---------------------------------------------------------------------
// Complete hinge: two plates (A at -x, B at +x) joined by the hinge
// ---------------------------------------------------------------------
module flex_hinge(part = "both", width = fh_width, gap = fh_gap, web_t = fh_web_t, plate = [25, 20, 4],
                  plate_b = undef, holes_a = [], holes_b = [], hole_d = 3.4, label = "",
                  fold = fh_fold, root_r = fh_root_r, neck_l = fh_neck_l, barbs = fh_barbs, rivet_d = fh_rivet_d) {
    pb = is_undef(plate_b) ? plate : plate_b;
    t = plate[2];
    e = flex_hinge_edge_x(gap, root_r, neck_l);
    assert(pb[2] == t, "flex_hinge: both plates must be the same thickness");
    assert(width <= plate[1] && width <= pb[1], "flex_hinge: width must be <= the plate widths");
    assert(hole_d >= 1.6, "flex_hinge: holes must be >= 1.6 mm");
    echo(str("flex_hinge: width ", width, ", web ", web_t, " x ", gap, " mm, strain at ", fold, " deg ",
             round(1000 * flex_hinge_strain(gap, web_t, fold)) / 10, " %, fold stiffness ",
             round(flex_hinge_k(width, gap, web_t)), " N*mm/rad, PETG tongue ~",
             round(flex_hinge_tongue_stress(width, gap, web_t, t, fold, rivet_d = rivet_d)),
             " MPa at ", fold, " deg, plate edges at x = +-", e));
    flex_hinge_joint(part, width = width, gap = gap, web_t = web_t, t = t, fold = fold, root_r = root_r,
                     neck_l = neck_l, barbs = barbs, rivet_d = rivet_d)
        difference() {
            union() {
                translate([-e - plate[0], -plate[1] / 2, 0]) cube(plate);
                translate([e, -pb[1] / 2, 0]) cube(pb);
            }
            for (h = holes_a) translate([-e - h[0], h[1], -1]) cylinder(d = hole_d, h = t + 2, $fn = 32);
            for (h = holes_b) translate([e + h[0], h[1], -1]) cylinder(d = hole_d, h = t + 2, $fn = 32);
            if (label != "")
                translate([e + pb[0] * 0.45, 0, t - 0.6]) linear_extrude(1)
                    text(label, size = min(5, pb[1] * 0.3), font = "DejaVu Sans:style=Bold", spacing = 1.15,
                         halign = "center", valign = "center");
        }
}

// ---------------------------------------------------------------------
// Test piece: 90 deg flex-fatigue coupon
// ---------------------------------------------------------------------
module flex_hinge_coupon(part = "both", width = fh_width, gap = fh_gap, web_t = fh_web_t, t = fh_t) {
    flex_hinge(part, width = width, gap = gap, web_t = web_t, plate = [24, width, t], plate_b = [40, width, t],
               holes_a = [[8, 0], [18, 0]], holes_b = [[34, 0]], hole_d = 3.4,
               label = str("T", web_t, " L", gap));
}

// ---------------------------------------------------------------------
// Demo: a folding arm on a chassis mounting plate, built from your own
// PETG shapes + flex_hinge_joint() (a 30 mm wide hinge)
// ---------------------------------------------------------------------
module flex_hinge_demo(part = "both") {
    w = 30; t = 4;
    e = flex_hinge_edge_x();
    flex_hinge_joint(part, width = w, t = t) {
        // chassis side: a mounting plate with two M3 holes
        difference() {
            translate([-e - 18, -21, 0]) cube([18, 42, t]);
            for (y = [-15, 15]) translate([-e - 9, y, -1]) cylinder(d = 3.4, h = t + 2, $fn = 32);
        }
        // the arm: 30 mm wide at the hinge, tapering to a rounded tip with a hole
        difference() {
            hull() {
                translate([e, -w / 2, 0]) cube([1, w, t]);
                translate([e + 52, 0, 0]) cylinder(r = 8, h = t, $fn = 64);
            }
            translate([e + 52, 0, -1]) cylinder(d = 3.4, h = t + 2, $fn = 32);
            hull() for (x = [e + 13, e + 36]) translate([x, 0, -1]) cylinder(d = 7, h = t + 2, $fn = 40);
        }
    }
}

// Cut-away preview (not a print): the default hinge cut on y = 0 and, on
// plate A's side, down to mid-tongue height to show the T-head and the
// barbs in plan.
module flex_hinge_section(part = "both") {
    for (p = ["petg", "tpu"]) if (part == "both" || part == p)
        color(p == "petg" ? petg_colour : tpu_colour) render() difference() {
            flex_hinge(p);
            translate([-100, -50, -1]) cube([200, 50, 10]);
            translate([-100, -eps, fh_t / 2]) cube([100, 50, 10]);
        }
}

// ---------------------------------------------------------------------
if (show == "demo") flex_hinge_demo(part);
else if (show == "test") flex_hinge_coupon(part);
else if (show == "section") flex_hinge_section(part);
